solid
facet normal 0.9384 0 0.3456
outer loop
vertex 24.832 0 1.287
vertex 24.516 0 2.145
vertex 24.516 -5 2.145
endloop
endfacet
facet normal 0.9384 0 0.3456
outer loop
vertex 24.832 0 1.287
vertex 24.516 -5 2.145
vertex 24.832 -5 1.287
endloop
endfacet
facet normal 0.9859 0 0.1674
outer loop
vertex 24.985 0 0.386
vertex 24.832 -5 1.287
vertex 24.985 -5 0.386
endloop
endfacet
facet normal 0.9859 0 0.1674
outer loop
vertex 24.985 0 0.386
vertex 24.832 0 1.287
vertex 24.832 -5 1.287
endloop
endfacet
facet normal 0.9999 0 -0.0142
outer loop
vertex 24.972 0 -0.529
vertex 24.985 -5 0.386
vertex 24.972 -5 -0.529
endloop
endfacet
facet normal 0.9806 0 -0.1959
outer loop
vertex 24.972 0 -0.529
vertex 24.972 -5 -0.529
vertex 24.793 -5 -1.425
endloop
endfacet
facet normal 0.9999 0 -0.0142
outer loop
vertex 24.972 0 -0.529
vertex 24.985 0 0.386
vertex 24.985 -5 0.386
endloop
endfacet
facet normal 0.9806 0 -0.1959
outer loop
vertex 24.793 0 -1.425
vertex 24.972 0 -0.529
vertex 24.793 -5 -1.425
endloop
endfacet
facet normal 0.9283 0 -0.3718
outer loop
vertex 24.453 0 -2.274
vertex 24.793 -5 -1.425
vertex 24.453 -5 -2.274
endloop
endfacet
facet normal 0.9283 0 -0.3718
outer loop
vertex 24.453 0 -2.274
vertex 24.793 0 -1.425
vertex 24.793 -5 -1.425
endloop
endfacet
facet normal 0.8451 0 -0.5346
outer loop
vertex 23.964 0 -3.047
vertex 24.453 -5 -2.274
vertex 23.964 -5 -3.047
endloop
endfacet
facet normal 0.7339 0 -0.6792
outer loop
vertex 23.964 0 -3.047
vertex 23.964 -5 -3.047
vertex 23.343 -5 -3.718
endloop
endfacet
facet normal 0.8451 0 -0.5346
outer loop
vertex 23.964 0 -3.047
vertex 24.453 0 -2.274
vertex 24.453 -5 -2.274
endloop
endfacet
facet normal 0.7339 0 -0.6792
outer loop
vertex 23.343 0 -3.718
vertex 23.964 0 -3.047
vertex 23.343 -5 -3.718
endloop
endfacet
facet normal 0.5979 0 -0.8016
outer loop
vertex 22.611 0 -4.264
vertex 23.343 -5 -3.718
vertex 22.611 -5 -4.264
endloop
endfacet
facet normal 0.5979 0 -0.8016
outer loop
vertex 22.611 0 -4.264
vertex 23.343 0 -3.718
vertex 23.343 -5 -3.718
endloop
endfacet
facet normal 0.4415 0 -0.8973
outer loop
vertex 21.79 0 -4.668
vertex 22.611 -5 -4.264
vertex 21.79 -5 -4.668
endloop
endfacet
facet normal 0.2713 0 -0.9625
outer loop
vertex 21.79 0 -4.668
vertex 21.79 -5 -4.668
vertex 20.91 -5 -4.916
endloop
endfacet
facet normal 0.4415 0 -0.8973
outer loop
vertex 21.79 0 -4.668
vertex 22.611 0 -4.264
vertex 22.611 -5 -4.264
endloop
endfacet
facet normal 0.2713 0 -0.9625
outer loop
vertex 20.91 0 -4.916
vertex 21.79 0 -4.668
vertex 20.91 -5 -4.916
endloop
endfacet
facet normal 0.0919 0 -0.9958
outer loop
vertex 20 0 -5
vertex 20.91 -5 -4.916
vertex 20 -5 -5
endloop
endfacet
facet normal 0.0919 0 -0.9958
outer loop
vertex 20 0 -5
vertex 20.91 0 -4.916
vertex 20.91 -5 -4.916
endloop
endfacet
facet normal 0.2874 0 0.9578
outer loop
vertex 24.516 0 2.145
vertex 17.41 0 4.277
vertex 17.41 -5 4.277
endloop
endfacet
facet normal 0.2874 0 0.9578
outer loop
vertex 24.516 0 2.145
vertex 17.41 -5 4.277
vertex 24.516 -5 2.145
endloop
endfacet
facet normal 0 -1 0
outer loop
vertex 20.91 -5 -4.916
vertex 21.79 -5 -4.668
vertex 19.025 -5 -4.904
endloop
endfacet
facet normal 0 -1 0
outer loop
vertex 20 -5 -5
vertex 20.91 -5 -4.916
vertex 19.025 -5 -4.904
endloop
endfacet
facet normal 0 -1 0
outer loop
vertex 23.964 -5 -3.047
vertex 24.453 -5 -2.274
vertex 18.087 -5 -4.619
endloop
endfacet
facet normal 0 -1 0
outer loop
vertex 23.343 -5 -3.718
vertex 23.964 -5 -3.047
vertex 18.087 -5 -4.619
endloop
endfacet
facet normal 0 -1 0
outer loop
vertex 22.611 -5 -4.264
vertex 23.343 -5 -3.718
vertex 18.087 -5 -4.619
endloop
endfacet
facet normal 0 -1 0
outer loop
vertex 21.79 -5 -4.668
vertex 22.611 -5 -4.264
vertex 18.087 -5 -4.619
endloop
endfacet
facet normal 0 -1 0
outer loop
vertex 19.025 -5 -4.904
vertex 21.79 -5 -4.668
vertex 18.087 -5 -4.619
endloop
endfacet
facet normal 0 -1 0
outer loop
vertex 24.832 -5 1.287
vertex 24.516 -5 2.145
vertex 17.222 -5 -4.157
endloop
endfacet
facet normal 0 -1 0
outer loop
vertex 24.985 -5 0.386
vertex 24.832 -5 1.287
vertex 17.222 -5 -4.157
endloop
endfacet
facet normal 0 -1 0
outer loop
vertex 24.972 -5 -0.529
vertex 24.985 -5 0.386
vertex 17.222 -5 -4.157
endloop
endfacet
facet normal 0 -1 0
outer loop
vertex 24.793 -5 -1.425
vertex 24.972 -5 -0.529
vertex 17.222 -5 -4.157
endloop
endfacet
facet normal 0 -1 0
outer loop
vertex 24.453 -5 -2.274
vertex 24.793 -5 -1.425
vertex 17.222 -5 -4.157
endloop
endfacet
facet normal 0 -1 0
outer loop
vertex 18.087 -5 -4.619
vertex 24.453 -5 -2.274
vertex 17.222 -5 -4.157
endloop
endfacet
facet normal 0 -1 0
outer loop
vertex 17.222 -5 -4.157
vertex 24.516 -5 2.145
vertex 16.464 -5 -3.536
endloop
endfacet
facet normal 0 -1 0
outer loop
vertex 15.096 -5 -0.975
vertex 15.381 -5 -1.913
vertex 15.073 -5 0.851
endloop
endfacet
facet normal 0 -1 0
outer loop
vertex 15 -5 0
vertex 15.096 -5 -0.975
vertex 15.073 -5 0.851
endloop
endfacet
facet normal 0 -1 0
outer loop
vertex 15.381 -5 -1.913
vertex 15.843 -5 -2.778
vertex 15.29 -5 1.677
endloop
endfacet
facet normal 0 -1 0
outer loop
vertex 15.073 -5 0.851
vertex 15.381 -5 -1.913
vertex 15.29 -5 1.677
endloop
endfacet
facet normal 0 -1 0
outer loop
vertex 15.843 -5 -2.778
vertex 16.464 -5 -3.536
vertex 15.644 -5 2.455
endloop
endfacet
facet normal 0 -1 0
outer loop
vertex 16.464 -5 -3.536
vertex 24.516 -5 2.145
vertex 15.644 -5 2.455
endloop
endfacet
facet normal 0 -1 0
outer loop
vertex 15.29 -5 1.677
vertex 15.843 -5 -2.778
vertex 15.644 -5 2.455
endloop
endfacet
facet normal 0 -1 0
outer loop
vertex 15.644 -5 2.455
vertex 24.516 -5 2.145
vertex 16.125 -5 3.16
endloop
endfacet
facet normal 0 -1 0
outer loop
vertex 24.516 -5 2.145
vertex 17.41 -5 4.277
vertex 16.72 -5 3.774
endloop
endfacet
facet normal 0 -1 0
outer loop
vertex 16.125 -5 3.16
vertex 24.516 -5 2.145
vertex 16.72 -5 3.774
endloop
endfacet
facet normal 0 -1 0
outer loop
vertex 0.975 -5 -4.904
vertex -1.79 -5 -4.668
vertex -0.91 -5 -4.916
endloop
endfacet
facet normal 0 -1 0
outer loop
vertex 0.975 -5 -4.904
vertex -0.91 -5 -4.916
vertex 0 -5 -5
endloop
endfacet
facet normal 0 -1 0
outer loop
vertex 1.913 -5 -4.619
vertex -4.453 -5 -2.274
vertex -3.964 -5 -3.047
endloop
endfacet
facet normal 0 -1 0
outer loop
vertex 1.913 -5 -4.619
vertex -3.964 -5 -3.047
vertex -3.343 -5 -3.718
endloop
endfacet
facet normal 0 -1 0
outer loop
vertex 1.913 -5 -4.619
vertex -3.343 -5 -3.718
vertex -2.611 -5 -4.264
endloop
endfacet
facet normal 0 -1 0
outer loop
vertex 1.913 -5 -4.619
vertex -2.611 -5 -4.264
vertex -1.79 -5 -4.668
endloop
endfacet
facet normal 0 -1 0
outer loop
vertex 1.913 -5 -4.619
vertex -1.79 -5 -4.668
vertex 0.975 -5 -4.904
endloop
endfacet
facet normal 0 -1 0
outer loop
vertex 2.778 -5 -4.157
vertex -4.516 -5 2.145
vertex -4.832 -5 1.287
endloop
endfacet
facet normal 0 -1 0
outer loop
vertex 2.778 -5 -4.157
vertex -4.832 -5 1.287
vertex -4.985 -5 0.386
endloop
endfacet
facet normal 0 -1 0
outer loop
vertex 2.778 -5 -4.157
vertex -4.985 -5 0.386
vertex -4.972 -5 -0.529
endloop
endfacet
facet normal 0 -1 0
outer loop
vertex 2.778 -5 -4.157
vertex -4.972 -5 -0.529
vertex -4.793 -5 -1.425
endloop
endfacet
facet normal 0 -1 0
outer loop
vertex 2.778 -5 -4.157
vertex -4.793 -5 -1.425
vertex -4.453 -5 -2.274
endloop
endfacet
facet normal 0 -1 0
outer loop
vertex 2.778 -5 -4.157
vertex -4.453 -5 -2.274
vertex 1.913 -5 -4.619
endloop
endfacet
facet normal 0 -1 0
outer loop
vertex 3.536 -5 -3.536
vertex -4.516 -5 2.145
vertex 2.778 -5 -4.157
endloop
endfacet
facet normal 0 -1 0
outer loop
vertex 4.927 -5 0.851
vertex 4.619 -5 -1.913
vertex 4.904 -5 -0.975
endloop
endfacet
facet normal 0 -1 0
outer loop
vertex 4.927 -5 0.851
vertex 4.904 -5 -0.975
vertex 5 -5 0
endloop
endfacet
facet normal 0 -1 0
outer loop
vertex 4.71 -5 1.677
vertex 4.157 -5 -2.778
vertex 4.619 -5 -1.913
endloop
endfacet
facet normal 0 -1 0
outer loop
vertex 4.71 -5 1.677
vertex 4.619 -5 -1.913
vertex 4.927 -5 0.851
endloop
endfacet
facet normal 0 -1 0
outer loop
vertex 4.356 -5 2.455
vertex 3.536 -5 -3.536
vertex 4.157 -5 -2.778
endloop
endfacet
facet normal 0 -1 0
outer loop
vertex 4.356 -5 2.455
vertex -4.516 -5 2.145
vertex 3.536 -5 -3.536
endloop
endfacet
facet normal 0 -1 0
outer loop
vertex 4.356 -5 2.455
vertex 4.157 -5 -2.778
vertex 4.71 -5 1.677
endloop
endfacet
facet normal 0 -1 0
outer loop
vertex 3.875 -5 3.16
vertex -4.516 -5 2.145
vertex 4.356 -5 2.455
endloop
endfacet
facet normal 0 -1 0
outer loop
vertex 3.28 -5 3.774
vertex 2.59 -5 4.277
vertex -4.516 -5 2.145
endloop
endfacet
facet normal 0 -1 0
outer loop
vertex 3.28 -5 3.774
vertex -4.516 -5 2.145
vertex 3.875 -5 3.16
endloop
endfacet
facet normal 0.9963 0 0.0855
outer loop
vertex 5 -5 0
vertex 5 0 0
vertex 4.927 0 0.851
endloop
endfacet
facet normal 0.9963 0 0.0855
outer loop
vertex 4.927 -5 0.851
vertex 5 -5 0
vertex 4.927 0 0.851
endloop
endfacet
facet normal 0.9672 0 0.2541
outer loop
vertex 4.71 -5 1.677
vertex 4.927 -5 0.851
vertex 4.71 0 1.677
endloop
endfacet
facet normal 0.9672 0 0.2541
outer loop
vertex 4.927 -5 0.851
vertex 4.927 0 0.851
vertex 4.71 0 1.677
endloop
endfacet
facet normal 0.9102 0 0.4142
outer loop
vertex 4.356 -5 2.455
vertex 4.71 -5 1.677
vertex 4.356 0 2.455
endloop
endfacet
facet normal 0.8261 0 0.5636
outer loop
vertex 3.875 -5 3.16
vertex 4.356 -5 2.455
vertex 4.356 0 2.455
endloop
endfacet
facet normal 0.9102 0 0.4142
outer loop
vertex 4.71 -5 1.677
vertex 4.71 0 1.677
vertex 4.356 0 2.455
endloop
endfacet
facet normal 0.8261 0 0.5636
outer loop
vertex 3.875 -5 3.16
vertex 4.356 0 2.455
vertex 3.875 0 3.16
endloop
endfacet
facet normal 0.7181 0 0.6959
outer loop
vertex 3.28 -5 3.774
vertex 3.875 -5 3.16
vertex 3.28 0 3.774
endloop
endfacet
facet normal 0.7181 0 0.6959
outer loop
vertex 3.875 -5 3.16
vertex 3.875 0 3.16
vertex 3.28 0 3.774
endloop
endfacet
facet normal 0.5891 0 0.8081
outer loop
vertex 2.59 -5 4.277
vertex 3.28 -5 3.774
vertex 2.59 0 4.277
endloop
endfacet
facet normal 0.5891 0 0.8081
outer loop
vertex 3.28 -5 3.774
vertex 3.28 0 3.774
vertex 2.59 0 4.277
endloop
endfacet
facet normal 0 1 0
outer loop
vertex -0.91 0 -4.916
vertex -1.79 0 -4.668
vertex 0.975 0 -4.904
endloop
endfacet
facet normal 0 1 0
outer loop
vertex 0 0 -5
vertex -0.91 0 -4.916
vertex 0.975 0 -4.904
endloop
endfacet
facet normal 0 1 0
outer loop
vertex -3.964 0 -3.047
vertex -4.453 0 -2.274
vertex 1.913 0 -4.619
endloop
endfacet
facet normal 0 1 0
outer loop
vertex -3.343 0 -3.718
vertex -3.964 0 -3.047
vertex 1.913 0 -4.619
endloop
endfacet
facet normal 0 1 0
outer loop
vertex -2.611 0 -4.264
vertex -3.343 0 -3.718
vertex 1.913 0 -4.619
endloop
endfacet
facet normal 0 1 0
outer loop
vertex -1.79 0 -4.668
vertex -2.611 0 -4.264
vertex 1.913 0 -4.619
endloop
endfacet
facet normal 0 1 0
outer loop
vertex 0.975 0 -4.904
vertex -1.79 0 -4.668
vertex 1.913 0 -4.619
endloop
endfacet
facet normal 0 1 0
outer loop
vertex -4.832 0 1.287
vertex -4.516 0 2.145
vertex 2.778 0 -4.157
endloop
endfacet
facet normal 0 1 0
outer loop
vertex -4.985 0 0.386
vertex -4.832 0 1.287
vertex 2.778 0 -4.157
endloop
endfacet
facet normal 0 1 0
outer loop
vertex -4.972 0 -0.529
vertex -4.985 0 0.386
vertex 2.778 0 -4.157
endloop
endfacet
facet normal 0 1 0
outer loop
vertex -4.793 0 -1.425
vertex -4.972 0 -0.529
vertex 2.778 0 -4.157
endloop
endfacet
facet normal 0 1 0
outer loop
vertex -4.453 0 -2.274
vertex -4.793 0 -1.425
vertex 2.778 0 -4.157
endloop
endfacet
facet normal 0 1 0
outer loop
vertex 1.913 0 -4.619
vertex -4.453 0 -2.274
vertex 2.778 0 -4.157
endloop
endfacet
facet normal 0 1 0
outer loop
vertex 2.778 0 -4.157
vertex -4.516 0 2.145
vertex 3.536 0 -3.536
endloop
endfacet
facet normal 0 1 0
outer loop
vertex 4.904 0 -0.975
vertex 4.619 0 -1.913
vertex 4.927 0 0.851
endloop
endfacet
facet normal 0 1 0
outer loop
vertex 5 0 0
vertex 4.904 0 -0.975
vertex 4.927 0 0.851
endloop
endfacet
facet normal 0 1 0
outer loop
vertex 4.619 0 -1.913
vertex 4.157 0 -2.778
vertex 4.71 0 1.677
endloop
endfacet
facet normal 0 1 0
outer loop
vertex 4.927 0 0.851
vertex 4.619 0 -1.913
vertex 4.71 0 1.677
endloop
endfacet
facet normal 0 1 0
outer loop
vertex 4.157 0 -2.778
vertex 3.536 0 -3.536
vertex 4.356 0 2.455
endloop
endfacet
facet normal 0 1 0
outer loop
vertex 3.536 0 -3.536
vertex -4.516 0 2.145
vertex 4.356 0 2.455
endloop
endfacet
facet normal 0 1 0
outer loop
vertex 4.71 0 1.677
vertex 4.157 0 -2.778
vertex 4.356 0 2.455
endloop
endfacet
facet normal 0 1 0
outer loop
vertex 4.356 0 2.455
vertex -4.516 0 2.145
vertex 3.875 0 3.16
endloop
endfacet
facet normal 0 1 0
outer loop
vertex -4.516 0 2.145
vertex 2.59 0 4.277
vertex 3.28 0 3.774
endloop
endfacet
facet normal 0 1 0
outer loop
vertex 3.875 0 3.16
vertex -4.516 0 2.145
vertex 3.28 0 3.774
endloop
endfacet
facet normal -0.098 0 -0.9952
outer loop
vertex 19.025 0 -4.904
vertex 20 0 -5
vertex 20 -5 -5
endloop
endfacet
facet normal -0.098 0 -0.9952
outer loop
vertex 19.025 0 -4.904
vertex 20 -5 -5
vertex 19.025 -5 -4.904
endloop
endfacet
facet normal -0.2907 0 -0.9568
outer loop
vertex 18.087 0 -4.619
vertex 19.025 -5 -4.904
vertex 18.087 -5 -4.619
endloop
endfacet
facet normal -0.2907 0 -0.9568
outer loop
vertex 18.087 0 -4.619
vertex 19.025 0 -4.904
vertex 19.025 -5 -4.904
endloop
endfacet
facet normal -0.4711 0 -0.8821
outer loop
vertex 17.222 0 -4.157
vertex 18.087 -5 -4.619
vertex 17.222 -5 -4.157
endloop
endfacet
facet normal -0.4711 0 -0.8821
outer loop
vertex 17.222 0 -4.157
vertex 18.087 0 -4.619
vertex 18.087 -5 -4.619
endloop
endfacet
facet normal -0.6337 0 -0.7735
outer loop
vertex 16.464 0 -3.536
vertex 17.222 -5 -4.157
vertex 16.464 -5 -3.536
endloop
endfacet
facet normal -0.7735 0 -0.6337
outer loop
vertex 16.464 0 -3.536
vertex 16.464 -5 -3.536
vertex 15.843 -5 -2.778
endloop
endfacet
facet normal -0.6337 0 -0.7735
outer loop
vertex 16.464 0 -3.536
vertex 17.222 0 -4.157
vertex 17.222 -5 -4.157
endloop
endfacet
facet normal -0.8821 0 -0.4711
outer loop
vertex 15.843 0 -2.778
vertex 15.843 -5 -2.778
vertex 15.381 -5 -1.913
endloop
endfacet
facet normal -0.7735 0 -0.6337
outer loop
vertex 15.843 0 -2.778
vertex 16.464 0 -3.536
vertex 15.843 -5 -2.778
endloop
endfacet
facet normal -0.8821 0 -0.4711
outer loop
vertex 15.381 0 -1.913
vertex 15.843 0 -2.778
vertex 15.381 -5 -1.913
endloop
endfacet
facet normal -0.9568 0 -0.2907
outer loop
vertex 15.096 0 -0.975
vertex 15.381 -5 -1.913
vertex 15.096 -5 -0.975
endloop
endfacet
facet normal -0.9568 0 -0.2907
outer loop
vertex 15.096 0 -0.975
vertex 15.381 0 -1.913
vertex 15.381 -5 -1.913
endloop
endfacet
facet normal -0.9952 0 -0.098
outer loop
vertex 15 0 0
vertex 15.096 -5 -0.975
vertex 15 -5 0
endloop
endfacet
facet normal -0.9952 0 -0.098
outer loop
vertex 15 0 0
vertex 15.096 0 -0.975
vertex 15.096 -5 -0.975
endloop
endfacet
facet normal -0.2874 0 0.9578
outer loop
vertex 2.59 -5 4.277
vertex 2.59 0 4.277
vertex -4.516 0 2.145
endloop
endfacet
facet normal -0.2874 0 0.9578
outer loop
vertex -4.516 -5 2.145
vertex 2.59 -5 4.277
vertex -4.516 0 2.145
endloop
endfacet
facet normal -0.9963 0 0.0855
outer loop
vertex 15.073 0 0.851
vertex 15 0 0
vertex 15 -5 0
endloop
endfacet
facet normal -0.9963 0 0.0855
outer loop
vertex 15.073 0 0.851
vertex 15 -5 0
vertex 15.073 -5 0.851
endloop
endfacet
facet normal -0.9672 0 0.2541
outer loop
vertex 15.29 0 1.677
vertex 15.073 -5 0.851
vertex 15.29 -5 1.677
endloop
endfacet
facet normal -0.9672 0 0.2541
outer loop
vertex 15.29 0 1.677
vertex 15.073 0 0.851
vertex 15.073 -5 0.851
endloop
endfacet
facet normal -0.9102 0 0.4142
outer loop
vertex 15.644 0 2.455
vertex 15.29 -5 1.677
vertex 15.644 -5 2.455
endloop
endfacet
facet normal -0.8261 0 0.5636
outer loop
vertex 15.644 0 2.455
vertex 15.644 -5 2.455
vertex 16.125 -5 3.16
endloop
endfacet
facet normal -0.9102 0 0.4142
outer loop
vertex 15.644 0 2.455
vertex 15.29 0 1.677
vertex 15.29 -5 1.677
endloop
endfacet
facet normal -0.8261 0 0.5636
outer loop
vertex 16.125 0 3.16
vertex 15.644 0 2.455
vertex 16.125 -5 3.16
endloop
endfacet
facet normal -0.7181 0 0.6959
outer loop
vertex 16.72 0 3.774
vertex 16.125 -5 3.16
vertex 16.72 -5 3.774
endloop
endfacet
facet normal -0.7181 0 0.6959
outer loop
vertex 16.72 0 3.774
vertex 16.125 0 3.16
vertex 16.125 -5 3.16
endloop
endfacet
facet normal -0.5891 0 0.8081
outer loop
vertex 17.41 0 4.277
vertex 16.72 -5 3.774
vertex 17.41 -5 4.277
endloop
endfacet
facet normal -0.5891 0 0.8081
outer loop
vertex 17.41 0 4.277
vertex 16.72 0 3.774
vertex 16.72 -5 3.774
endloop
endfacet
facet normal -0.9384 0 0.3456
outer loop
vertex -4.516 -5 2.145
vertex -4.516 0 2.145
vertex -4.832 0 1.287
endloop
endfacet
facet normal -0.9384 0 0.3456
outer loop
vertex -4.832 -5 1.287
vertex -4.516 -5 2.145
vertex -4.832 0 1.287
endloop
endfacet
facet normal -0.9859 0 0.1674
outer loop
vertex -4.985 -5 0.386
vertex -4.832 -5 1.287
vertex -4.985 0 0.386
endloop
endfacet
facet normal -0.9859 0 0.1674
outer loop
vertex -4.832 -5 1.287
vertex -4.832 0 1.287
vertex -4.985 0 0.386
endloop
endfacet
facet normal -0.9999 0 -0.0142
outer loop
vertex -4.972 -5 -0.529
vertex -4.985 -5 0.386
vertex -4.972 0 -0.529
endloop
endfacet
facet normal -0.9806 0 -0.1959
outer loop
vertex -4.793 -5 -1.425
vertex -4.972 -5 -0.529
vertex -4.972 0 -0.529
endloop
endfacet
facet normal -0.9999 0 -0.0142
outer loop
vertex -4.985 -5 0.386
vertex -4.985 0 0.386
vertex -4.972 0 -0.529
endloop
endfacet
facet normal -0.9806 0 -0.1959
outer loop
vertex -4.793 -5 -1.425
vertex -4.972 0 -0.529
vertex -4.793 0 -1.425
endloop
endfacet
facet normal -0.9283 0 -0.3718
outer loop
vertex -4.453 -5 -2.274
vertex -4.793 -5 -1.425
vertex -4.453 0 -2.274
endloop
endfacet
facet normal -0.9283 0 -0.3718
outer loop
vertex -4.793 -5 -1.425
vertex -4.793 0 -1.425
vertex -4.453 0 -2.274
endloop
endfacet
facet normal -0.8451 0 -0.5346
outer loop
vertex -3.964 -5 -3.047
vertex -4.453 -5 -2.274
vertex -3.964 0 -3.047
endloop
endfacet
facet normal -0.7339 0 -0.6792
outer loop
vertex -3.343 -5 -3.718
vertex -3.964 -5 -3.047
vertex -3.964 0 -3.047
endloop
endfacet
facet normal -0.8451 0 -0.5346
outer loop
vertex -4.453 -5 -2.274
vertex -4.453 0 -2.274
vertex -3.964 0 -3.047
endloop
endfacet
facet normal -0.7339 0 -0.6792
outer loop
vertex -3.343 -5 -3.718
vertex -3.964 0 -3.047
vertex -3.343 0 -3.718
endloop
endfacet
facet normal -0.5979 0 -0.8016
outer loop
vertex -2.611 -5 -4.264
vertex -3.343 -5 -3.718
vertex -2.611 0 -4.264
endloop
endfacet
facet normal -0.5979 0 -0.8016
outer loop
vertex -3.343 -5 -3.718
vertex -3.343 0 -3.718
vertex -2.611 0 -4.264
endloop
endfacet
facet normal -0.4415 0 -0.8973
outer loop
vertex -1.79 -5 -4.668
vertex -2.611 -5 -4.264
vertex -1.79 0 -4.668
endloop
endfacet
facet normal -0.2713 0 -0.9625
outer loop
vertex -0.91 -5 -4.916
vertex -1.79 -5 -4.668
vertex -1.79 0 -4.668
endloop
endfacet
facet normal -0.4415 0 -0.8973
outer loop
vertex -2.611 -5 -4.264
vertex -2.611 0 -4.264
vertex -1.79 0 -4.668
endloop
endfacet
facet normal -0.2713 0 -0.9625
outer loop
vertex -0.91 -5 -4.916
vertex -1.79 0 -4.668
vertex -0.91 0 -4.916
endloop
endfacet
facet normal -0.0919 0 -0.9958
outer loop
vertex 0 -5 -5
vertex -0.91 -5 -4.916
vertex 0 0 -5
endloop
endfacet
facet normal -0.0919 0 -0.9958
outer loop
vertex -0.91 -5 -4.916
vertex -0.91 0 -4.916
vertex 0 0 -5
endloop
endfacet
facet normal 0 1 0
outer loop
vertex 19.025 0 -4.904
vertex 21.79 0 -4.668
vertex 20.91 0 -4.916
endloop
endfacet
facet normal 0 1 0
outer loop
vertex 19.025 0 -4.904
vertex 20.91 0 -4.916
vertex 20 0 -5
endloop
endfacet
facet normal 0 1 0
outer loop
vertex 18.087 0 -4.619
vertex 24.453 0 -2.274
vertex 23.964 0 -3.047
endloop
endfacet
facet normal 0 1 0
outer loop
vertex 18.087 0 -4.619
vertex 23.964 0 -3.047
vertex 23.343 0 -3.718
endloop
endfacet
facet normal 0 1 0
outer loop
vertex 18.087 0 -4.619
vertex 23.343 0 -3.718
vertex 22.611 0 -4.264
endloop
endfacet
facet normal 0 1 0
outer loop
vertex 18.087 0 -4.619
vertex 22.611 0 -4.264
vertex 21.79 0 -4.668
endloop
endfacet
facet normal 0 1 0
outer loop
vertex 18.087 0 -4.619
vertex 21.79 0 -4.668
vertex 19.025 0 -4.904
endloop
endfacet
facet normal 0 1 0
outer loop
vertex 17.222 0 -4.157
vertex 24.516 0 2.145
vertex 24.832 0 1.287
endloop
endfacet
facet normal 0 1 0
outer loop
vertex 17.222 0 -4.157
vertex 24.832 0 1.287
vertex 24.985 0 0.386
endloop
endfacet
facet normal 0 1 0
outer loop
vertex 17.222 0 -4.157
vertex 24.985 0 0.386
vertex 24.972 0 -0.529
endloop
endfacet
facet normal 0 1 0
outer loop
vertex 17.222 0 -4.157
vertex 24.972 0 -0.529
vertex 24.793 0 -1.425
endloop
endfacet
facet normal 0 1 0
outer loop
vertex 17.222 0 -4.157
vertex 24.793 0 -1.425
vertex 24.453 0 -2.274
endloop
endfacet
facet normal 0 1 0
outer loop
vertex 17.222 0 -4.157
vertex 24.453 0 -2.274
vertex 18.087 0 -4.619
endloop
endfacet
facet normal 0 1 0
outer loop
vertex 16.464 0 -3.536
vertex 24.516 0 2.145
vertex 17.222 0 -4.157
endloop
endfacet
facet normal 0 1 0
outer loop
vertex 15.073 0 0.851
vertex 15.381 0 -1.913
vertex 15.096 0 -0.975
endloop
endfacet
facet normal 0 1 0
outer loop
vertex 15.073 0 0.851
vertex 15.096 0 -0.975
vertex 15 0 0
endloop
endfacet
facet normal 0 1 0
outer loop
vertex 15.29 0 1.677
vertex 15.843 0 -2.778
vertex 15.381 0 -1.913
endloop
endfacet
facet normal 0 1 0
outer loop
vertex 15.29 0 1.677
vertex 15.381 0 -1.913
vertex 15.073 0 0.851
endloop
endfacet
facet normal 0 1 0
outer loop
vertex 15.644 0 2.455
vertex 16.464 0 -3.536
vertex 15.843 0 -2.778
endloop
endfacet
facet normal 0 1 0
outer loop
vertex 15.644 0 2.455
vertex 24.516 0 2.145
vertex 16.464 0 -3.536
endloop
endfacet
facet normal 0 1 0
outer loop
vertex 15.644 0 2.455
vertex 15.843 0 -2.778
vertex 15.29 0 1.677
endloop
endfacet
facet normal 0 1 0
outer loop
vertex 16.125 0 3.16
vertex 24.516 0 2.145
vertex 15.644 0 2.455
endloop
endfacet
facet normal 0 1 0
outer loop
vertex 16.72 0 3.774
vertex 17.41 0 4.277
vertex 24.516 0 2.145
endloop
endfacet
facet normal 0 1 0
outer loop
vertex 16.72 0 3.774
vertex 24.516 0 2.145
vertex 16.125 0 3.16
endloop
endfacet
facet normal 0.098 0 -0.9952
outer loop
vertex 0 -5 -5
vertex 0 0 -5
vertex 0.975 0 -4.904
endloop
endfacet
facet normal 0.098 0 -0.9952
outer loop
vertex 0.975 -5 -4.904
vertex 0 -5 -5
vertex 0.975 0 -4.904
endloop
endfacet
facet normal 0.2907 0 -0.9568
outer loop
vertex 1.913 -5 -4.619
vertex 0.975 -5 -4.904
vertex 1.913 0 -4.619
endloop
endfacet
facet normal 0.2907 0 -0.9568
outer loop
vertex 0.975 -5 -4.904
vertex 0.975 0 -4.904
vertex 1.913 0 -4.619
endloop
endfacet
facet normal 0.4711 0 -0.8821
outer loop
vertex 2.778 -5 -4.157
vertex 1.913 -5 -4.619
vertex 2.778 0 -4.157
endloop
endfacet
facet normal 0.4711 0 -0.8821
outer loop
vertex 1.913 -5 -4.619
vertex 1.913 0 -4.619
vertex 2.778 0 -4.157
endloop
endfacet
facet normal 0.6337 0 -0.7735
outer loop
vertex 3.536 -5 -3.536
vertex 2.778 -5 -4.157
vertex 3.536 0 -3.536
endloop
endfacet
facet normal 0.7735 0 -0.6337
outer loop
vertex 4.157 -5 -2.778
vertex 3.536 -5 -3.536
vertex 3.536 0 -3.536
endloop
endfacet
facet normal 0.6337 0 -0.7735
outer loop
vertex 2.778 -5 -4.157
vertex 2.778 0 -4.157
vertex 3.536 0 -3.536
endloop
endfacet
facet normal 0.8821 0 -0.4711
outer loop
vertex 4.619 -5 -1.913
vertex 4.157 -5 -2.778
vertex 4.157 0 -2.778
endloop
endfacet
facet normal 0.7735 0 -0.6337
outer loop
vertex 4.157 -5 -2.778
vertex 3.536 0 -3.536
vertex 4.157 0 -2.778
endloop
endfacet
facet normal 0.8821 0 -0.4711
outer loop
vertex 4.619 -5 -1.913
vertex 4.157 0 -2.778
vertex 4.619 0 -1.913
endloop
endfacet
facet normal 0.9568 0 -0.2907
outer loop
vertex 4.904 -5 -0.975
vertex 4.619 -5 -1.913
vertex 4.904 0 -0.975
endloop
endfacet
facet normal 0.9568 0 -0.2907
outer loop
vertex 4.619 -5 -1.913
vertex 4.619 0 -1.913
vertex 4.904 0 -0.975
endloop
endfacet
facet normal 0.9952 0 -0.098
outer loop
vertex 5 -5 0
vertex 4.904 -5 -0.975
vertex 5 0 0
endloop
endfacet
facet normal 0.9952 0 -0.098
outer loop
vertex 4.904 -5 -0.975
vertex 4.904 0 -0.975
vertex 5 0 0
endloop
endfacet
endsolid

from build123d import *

# Parameters (mm, degrees)
F2_DEPTH = 5


with BuildPart() as f2:
    # F1 (on Front) → F2 (new body)
    with BuildSketch(Plane.XZ):
        with BuildLine():
            ThreePointArc((0, -5), (3.5355339059, -3.5355339059), (5, 0))
            ThreePointArc((5, 0), (4.355999592, 2.454642042), (2.5898929782, 4.2769678935))
            Line((2.5898929782, 4.2769678935), (-4.5164984828, 2.1450504552))
            ThreePointArc((-4.5164984828, 2.1450504552), (-4.2264200144, -2.6715863943), (0, -5))
        make_face()
    extrude(amount=F2_DEPTH)


with BuildPart() as f4_1:
    # F4: instance of F2
    add(f2.part.mirror(Plane.YZ.offset(10)))


solid = Compound([f2.part, f4_1.part])
